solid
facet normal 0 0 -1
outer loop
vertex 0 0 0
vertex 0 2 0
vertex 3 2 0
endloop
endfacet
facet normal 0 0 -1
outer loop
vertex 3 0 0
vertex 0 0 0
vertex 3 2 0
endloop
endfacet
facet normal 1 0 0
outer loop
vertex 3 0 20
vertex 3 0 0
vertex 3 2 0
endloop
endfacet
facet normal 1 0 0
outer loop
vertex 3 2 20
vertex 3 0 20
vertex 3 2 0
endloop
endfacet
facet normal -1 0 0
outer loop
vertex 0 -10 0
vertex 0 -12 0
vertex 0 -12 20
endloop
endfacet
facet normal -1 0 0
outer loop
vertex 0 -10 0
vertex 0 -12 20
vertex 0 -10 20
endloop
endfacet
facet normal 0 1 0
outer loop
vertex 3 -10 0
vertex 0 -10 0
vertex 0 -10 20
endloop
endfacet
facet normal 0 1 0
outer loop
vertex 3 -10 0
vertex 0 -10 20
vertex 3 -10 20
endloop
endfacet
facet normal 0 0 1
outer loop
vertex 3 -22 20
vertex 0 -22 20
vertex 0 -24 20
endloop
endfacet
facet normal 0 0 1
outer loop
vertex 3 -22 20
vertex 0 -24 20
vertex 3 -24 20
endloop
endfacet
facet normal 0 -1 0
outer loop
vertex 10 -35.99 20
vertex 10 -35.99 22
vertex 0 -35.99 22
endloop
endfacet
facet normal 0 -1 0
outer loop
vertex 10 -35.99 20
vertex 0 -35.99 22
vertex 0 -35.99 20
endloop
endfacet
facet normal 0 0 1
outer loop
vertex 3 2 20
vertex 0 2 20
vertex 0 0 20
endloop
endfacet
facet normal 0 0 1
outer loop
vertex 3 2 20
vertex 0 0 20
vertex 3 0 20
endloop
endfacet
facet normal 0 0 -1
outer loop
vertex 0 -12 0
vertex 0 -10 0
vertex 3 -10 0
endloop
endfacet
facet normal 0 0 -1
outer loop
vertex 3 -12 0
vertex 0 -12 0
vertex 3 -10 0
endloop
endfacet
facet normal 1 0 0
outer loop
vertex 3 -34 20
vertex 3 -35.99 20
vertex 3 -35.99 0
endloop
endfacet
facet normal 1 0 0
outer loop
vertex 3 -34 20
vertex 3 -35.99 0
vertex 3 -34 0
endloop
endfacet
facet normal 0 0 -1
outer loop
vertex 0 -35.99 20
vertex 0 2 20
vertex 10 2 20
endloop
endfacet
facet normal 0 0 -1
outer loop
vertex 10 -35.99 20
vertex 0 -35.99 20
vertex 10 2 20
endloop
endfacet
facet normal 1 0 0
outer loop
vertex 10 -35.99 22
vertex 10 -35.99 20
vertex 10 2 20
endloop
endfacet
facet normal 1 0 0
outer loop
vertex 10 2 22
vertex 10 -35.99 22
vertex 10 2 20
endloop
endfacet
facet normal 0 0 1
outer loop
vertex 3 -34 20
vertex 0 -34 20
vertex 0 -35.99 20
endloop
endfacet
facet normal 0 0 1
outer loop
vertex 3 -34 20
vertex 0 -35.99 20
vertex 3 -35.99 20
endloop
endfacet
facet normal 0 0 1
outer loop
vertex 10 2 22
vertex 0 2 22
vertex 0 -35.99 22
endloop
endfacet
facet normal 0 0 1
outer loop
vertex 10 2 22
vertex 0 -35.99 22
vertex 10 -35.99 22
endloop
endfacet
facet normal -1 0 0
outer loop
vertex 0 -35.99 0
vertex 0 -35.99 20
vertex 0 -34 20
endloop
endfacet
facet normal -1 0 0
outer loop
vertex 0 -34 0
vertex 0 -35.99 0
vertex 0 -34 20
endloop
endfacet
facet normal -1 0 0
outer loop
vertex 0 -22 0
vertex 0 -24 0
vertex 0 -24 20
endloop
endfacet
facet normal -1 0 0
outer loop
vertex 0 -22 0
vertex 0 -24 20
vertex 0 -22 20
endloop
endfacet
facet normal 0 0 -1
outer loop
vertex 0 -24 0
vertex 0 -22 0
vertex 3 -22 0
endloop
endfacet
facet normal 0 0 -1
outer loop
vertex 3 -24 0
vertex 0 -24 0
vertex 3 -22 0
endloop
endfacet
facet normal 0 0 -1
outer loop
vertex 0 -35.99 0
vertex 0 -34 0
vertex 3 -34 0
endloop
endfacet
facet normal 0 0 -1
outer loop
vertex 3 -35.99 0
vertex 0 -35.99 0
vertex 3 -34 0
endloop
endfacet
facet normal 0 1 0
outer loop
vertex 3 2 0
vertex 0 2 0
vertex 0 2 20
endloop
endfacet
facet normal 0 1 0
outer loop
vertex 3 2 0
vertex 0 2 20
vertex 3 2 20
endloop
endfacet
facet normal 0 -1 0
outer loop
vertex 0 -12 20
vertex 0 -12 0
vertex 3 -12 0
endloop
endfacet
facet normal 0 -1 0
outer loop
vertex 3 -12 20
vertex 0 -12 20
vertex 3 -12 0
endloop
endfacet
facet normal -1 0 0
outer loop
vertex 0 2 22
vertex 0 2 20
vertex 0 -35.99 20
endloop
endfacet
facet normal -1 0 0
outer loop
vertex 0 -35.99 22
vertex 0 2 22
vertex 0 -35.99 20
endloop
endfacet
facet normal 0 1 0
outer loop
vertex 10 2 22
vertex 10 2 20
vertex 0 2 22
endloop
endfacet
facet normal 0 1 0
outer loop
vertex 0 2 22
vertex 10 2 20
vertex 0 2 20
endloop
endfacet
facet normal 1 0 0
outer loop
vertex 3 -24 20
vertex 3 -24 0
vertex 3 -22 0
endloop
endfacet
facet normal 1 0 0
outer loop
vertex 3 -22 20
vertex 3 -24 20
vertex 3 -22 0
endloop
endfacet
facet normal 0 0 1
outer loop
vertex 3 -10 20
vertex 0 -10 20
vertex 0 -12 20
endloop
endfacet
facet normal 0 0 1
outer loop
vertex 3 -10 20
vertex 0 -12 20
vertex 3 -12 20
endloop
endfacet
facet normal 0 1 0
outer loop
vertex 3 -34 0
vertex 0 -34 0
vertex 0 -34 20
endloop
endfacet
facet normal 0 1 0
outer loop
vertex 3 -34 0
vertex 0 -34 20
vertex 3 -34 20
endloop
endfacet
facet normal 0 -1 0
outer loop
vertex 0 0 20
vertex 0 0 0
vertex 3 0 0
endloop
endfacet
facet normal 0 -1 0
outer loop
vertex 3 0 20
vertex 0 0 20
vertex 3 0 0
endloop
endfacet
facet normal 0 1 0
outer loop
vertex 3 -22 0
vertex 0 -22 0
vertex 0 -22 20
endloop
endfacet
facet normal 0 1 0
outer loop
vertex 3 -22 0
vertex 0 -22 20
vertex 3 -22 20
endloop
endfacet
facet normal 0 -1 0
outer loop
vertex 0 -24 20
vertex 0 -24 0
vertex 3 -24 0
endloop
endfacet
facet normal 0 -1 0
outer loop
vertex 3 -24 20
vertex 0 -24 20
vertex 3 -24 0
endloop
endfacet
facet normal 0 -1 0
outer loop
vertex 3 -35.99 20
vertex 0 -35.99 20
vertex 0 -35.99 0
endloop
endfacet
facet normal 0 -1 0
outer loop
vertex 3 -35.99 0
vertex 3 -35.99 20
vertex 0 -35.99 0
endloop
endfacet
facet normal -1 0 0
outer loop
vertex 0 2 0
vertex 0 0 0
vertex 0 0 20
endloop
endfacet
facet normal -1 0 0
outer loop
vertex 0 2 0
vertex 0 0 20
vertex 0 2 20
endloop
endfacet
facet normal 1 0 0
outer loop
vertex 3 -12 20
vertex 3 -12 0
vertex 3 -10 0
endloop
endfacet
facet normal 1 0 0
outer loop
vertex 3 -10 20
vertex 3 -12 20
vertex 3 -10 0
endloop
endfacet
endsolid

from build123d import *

# Parameters (mm, degrees)
F0_W     = 3
F0_H     = 2
F1_DEPTH = 20
F2_W     = 3
F2_H     = 2
F3_DEPTH = 2
F4_W     = 7.0251794532
F4_H     = 3.7774270773
F5_DEPTH = 25
F6_W     = 12.01007846
F6_H     = 2
F7_DEPTH = 25


with BuildPart() as f1:
    # F0 (on Top) → F1 (new body)
    with BuildSketch(Plane.XY):
        with Locations((1.5, 1)):
            Rectangle(F0_W, F0_H)
    extrude(amount=F1_DEPTH)


with BuildPart() as f1b:
    # F0 (on Top) → F1, piece 2 (new body)
    with BuildSketch(Plane.XY):
        with Locations((1.5, -11)):
            Rectangle(F0_W, F0_H)
    extrude(amount=F1_DEPTH)


with BuildPart() as f1c:
    # F0 (on Top) → F1, piece 3 (new body)
    with BuildSketch(Plane.XY):
        with Locations((1.5, -23)):
            Rectangle(F0_W, F0_H)
    extrude(amount=F1_DEPTH)


with BuildPart() as f1d:
    # F0 (on Top) → F1, piece 4 (new body)
    with BuildSketch(Plane.XY):
        with Locations((1.5, -35)):
            Rectangle(F0_W, F0_H)
    extrude(amount=F1_DEPTH)


with BuildPart() as f1e:
    # F0 (on Top) → F1, piece 5 (new body)
    with BuildSketch(Plane.XY):
        with Locations((1.5, -47)):
            Rectangle(F0_W, F0_H)
    extrude(amount=F1_DEPTH)


with BuildPart() as f1f:
    # F0 (on Top) → F1, piece 6 (new body)
    with BuildSketch(Plane.XY):
        with Locations((1.5, -59)):
            Rectangle(F0_W, F0_H)
    extrude(amount=F1_DEPTH)

    # F4 (on face) → F5 (cut)
    with BuildSketch(Plane.XY.offset(20)):
        with Locations((1.5459530987, -58.1112864614)):
            Rectangle(F4_W, F4_H)
    extrude(amount=-F5_DEPTH, mode=Mode.SUBTRACT)


with BuildPart() as f3:
    # F2 (on face) → F3 (new body)
    with BuildSketch(Plane.XY.offset(20)):
        with Locations((1.5, 1)):
            Rectangle(F2_W, F2_H)
        Polygon((10, 2), (3, 2), (3, 0), (0, 0), (0, -48), (10, -48), align=None)
    extrude(amount=F3_DEPTH)


with BuildPart() as f7_tool:
    # F6 (on face) → F7 (new body)
    with BuildSketch(Plane(origin=(0, 0, 0), x_dir=(0, -1, 0), z_dir=(-1, 0, 0))):
        with Locations((41.99496077, 21)):
            Rectangle(F6_W, F6_H)
        Polygon((48.0117946863, 22), (48, 22), (48, 20), (35.98992154, 20), (35.98992154, 0), (48.0117946863, 0), align=None)
    extrude(amount=-F7_DEPTH)


with BuildPart() as f1d_1:
    add(f1d.part)

    # F7: cut by f7_tool
    add(f7_tool.part, mode=Mode.SUBTRACT)


with BuildPart() as f1e_1:
    add(f1e.part)

    # F7: cut by f7_tool
    add(f7_tool.part, mode=Mode.SUBTRACT)


with BuildPart() as f3_1:
    add(f3.part)

    # F7: cut by f7_tool
    add(f7_tool.part, mode=Mode.SUBTRACT)


solid = Compound([f1.part, f1b.part, f1c.part, f1d_1.part, f3_1.part])
